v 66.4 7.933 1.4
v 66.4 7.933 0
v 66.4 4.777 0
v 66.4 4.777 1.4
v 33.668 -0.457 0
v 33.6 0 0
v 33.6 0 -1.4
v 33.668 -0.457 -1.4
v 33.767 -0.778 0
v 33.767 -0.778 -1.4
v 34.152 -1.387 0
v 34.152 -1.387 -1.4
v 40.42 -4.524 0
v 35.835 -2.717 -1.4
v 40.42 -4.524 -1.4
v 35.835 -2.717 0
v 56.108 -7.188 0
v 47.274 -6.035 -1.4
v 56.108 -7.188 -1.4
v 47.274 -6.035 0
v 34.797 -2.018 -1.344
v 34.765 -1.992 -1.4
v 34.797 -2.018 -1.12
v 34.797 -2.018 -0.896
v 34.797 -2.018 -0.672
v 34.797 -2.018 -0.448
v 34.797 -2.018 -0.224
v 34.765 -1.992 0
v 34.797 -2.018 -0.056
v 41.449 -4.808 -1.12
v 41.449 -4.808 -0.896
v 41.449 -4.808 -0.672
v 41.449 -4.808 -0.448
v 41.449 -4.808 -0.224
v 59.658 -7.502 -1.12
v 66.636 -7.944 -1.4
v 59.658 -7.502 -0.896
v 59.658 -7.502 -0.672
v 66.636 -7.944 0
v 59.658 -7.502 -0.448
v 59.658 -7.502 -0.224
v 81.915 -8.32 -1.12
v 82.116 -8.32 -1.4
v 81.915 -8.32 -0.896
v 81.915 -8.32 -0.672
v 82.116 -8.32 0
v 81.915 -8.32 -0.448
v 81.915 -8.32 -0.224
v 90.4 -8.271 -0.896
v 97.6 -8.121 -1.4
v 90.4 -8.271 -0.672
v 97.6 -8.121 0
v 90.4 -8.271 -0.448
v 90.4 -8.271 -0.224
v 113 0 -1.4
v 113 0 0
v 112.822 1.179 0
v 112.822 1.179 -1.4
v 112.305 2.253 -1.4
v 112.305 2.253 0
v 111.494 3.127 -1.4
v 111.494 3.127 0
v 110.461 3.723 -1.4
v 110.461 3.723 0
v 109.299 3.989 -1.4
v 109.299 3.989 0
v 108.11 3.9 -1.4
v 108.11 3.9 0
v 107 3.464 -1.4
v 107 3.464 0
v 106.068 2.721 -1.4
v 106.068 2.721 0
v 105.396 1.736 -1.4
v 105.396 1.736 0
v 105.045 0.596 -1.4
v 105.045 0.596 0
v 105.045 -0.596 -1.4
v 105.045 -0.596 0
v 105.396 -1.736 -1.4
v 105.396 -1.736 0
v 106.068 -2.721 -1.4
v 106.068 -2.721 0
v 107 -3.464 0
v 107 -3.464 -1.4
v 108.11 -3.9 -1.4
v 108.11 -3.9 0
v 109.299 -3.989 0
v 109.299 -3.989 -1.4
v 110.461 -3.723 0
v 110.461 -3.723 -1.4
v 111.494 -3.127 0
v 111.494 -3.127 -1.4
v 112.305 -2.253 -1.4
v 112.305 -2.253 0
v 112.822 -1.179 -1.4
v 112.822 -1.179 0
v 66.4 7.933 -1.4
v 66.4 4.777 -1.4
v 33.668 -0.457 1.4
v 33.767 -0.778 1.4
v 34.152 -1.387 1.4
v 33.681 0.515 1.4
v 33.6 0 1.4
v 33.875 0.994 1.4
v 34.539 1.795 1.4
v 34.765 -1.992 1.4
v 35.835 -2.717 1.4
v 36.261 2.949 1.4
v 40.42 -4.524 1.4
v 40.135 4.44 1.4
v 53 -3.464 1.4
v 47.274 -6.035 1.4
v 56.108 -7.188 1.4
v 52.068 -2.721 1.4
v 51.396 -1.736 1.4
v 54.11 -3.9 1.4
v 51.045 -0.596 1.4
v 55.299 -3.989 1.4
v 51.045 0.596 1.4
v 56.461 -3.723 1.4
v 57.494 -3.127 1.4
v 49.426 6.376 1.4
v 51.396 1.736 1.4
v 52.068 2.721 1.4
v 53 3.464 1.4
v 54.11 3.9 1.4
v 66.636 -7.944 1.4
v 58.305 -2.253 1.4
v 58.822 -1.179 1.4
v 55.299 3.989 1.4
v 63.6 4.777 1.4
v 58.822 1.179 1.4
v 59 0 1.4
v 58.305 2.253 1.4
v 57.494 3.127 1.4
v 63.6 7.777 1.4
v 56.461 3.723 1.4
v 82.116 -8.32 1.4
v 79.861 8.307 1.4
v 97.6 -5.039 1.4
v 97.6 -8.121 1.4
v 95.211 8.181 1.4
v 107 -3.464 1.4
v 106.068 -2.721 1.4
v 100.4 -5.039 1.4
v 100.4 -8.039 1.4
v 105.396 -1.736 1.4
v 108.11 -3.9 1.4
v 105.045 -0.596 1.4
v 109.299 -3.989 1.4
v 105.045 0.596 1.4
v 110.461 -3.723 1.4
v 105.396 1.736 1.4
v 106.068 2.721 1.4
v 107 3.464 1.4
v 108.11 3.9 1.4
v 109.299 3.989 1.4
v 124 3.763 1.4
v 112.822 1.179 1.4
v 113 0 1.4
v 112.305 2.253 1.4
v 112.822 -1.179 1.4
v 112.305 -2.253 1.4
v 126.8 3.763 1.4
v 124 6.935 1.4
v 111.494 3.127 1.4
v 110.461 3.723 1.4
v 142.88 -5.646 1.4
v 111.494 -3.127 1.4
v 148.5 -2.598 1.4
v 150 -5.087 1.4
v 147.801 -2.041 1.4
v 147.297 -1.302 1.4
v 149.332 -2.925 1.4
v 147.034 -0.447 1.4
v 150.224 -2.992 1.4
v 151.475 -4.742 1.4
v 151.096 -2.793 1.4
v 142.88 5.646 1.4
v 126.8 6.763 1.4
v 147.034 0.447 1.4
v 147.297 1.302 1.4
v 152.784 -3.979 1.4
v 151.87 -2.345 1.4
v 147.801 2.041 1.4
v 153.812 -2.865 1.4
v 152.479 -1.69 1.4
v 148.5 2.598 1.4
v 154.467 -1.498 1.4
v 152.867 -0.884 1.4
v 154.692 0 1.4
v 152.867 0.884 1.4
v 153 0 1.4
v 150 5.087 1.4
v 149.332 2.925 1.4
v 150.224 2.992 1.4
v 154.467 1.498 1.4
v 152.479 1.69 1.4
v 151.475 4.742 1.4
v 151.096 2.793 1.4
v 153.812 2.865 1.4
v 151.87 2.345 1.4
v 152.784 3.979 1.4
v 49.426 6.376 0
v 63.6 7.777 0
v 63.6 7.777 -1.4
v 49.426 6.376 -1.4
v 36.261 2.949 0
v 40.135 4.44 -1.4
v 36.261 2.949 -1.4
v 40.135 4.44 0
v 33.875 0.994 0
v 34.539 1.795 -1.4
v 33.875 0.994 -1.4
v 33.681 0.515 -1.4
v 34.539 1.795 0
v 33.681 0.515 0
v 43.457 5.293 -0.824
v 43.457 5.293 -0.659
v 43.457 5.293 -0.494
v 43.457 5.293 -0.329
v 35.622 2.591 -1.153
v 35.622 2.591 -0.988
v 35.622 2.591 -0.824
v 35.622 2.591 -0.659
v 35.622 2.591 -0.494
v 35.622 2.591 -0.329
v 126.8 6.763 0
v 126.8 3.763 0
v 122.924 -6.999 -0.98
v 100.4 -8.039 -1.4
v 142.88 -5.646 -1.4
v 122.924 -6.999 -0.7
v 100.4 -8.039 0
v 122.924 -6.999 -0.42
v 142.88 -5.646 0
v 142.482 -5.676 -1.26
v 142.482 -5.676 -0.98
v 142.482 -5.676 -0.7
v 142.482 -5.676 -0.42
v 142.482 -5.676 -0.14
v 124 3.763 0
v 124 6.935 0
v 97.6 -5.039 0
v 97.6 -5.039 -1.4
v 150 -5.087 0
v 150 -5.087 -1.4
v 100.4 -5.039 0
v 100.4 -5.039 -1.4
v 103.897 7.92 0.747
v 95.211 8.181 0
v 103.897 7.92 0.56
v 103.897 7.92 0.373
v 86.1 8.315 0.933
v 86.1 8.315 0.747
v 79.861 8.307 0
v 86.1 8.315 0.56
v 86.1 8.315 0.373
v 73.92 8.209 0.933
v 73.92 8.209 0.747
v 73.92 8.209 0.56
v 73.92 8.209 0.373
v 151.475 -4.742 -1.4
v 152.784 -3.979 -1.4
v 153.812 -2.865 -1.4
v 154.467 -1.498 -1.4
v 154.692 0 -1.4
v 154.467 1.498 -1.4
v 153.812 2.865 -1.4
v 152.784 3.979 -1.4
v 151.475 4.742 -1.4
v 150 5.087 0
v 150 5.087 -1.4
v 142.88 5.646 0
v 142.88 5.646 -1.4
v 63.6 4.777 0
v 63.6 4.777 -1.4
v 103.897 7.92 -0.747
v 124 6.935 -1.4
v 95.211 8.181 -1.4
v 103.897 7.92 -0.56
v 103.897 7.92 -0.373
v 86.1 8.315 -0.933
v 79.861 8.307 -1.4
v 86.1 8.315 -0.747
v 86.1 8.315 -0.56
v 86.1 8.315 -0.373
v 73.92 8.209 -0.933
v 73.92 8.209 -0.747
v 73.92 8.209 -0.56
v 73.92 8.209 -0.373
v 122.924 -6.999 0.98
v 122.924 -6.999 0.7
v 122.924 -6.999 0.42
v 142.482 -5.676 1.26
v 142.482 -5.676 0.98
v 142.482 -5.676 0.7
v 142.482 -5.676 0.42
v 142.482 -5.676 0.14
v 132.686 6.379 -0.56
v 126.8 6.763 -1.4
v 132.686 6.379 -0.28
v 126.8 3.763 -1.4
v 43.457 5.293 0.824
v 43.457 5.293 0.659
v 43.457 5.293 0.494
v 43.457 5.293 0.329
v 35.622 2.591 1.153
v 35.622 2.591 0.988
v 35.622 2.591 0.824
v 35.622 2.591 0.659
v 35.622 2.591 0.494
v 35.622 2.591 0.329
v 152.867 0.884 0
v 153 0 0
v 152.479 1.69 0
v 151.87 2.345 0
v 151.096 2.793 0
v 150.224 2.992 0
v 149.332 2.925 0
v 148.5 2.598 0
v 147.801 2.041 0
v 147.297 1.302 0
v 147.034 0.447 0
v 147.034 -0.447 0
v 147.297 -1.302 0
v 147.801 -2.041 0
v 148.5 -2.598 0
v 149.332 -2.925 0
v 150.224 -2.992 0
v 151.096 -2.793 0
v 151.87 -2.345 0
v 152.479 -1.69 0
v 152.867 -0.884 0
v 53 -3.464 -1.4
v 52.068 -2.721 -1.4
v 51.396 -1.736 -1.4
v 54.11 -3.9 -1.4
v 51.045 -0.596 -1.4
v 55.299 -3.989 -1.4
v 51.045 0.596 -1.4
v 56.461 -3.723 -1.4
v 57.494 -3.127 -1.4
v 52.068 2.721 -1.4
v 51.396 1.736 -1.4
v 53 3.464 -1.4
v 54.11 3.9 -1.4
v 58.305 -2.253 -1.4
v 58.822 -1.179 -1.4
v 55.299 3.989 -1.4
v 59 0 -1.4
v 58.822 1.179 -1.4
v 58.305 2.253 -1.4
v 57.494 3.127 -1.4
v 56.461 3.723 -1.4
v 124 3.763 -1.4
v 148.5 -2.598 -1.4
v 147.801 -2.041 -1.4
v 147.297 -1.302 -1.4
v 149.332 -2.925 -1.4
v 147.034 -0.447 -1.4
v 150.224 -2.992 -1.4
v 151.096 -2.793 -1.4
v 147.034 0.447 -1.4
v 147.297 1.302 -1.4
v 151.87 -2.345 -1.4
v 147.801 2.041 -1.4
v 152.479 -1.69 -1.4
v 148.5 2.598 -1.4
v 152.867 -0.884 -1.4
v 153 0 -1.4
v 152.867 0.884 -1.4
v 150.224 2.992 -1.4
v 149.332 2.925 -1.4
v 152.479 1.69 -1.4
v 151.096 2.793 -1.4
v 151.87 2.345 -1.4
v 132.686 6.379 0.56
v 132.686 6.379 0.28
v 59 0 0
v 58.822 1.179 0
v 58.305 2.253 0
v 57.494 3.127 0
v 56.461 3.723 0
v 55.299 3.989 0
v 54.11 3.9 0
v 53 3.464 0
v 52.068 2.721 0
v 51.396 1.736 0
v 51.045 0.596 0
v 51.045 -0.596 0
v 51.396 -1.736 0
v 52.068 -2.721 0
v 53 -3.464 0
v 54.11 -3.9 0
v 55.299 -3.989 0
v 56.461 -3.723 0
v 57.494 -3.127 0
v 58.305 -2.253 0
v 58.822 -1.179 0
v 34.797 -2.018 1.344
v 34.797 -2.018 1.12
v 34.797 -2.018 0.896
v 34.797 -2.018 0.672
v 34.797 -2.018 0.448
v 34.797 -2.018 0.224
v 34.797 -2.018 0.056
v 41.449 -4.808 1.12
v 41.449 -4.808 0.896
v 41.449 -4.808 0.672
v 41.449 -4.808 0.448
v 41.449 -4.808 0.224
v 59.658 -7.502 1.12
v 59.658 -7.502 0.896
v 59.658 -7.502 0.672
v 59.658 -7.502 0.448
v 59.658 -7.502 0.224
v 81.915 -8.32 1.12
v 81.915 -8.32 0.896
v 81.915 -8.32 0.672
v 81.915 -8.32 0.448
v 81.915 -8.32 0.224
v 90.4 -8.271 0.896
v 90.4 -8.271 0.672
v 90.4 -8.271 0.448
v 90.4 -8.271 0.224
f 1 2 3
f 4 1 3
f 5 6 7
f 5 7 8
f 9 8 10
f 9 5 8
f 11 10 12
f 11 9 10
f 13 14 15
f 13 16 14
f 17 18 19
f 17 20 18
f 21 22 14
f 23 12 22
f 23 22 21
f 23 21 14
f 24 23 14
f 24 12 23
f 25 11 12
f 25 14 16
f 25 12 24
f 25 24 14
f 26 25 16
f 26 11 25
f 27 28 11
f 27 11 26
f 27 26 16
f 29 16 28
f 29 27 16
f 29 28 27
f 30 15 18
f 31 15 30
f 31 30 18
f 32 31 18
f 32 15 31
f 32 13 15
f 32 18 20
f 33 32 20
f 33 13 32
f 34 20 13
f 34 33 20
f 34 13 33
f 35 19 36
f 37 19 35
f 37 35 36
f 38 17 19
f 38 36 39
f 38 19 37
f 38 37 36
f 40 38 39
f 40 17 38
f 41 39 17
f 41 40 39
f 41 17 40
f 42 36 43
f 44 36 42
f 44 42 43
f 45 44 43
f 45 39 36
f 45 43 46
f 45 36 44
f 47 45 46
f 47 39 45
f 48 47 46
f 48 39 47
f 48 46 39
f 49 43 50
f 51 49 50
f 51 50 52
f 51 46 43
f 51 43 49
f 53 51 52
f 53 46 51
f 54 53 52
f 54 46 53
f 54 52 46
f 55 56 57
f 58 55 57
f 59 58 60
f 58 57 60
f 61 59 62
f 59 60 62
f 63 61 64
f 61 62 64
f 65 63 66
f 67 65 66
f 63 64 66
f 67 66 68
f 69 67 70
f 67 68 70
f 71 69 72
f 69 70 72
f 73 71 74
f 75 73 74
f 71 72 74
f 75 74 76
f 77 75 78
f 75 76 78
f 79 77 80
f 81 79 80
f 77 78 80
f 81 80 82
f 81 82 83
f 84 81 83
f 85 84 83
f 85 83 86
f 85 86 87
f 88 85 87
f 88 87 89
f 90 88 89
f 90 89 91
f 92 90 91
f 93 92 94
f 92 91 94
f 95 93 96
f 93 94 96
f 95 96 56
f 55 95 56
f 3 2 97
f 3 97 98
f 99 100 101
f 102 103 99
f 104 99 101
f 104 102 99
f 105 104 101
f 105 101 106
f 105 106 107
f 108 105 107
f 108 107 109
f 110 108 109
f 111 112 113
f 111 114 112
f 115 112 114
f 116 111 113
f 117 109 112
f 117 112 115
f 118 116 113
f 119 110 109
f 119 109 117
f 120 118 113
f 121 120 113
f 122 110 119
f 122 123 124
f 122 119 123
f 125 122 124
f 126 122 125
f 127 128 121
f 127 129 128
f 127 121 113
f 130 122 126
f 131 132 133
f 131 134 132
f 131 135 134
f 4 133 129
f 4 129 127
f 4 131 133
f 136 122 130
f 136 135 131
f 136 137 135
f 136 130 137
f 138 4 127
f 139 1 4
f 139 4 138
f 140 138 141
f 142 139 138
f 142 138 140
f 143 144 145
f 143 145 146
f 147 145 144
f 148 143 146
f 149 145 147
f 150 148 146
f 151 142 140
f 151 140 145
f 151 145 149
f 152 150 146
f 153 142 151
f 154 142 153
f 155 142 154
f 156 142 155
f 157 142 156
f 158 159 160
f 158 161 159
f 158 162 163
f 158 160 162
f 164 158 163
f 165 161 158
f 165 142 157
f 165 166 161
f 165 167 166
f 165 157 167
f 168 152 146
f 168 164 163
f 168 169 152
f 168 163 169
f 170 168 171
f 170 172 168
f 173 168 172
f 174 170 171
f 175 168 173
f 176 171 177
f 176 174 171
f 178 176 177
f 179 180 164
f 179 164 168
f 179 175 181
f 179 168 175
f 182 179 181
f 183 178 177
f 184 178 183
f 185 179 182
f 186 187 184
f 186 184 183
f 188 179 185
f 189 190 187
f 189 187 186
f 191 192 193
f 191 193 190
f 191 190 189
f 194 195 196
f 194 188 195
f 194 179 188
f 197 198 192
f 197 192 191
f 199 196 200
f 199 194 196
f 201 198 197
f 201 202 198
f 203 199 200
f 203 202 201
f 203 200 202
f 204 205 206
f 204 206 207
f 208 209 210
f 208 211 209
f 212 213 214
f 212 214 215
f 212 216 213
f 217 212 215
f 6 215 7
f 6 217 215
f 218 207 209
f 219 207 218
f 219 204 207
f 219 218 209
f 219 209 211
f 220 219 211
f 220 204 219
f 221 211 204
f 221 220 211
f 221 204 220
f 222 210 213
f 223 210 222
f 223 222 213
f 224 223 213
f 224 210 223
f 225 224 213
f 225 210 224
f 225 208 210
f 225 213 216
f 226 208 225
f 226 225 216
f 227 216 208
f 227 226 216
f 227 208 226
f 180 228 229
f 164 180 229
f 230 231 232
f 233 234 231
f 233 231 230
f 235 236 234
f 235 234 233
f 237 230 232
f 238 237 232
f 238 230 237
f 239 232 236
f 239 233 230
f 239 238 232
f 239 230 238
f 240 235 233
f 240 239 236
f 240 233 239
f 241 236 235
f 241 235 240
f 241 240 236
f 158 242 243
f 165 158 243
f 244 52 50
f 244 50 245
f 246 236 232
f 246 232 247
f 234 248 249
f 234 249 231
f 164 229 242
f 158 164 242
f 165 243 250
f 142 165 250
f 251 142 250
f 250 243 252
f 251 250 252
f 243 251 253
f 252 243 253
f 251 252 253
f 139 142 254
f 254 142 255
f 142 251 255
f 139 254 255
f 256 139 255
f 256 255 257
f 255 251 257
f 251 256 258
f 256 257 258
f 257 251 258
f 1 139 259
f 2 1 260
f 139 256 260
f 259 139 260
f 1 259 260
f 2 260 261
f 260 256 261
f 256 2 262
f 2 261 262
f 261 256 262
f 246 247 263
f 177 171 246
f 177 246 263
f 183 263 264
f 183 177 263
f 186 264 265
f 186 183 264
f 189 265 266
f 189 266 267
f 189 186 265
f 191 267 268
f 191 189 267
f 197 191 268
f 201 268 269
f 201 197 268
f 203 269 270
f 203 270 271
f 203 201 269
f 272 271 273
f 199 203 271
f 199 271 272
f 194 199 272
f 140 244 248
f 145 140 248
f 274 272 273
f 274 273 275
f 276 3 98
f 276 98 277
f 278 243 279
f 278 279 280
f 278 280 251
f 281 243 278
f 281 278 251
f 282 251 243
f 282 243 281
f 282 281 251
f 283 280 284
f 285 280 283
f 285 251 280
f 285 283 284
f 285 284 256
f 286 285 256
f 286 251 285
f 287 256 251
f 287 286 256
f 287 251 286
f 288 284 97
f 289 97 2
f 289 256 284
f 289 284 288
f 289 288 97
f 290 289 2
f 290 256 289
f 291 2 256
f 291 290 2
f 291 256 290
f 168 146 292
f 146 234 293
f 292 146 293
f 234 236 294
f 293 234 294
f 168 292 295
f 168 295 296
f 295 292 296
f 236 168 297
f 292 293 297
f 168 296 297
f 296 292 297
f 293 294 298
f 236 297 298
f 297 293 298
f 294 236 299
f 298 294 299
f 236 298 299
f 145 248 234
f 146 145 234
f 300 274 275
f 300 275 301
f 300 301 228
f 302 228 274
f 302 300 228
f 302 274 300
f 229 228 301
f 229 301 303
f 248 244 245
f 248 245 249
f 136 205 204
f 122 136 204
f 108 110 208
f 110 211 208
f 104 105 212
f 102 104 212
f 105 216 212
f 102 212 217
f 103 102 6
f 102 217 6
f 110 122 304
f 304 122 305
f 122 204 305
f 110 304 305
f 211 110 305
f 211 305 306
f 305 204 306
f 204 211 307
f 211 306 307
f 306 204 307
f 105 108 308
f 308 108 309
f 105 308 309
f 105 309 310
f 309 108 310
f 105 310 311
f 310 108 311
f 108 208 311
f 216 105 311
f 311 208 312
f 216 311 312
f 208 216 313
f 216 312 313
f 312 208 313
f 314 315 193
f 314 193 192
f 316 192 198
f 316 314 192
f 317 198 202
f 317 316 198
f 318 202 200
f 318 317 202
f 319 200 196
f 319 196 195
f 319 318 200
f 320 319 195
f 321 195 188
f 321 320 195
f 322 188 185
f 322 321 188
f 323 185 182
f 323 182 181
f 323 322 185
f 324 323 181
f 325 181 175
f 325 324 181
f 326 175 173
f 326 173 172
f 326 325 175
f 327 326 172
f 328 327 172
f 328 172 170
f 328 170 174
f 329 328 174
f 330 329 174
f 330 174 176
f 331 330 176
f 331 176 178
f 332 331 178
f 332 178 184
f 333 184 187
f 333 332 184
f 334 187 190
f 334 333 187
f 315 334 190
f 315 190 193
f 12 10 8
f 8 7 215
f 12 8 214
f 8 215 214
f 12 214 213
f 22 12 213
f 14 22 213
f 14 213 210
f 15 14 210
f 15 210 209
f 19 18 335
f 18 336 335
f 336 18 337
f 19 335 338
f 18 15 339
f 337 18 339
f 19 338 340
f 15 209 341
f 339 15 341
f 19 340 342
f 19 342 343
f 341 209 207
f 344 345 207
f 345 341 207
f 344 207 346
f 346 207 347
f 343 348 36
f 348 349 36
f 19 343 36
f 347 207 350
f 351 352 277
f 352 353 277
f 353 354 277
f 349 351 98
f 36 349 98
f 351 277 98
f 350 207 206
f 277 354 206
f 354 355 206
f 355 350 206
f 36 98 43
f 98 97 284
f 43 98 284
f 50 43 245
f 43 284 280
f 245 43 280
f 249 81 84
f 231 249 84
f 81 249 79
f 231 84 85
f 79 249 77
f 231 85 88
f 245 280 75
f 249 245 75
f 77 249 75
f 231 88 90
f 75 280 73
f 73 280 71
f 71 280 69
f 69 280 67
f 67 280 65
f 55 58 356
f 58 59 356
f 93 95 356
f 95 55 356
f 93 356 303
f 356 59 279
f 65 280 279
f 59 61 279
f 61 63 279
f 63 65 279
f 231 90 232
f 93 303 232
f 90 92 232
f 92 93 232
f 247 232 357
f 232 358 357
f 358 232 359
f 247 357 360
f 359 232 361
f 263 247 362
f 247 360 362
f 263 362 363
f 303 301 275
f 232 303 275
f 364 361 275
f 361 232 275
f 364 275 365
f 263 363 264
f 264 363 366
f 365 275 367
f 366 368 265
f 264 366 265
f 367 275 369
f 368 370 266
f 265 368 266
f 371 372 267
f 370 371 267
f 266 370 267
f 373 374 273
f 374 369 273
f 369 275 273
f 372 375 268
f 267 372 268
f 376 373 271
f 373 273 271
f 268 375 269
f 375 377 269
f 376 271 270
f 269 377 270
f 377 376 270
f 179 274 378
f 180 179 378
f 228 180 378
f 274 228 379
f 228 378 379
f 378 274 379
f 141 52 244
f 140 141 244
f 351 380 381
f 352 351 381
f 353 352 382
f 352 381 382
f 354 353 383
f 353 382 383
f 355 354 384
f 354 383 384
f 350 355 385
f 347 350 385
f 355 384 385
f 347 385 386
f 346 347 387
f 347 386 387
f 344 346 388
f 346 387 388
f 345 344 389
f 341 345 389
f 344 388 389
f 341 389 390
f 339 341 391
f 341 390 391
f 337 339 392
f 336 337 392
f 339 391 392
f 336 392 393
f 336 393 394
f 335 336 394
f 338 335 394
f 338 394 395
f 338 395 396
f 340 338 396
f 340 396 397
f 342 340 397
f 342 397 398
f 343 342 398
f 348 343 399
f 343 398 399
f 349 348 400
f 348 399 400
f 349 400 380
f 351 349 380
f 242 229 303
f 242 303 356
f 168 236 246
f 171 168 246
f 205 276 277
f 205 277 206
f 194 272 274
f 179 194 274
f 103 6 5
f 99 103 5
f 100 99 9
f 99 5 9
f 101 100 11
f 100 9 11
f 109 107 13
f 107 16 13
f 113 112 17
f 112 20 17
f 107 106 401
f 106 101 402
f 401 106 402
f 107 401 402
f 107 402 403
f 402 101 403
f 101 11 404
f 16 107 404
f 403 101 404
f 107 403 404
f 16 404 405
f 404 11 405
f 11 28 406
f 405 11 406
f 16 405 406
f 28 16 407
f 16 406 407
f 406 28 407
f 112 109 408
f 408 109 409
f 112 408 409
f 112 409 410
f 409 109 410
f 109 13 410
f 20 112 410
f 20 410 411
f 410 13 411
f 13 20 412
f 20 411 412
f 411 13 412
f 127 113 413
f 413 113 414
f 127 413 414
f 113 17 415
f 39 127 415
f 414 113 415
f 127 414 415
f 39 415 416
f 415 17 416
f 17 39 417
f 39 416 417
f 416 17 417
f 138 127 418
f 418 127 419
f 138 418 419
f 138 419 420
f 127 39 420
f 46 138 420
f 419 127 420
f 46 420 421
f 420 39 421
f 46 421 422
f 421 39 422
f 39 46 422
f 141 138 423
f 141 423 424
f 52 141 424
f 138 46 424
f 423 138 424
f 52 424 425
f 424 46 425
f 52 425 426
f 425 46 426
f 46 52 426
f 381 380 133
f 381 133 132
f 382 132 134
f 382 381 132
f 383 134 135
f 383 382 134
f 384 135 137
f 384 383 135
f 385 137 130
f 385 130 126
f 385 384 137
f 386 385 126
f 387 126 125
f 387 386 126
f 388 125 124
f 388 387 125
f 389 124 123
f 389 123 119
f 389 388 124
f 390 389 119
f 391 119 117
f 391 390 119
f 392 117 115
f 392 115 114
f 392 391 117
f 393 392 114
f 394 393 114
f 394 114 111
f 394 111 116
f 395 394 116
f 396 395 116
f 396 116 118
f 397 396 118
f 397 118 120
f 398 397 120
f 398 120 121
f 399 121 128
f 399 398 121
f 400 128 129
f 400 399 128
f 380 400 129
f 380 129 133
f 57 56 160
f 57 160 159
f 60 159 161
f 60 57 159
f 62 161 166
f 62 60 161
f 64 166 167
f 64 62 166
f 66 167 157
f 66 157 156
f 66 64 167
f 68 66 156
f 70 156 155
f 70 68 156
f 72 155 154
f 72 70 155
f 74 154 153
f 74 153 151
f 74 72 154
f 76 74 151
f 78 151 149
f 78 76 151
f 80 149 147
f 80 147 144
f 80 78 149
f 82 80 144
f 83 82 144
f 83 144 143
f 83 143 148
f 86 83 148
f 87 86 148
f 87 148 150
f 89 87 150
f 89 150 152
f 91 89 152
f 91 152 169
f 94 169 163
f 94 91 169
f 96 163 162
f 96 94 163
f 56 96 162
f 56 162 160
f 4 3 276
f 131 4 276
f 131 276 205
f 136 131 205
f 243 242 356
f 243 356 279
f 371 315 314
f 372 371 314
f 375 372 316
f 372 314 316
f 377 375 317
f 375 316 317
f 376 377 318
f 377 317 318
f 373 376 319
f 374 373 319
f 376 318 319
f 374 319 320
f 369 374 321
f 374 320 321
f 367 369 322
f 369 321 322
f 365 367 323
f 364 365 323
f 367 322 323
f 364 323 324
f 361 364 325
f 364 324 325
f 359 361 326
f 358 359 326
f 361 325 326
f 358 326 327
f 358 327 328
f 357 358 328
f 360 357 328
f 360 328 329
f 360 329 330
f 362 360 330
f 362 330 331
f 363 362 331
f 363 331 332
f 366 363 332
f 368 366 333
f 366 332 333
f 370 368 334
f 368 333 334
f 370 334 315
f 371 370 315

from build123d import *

# Parameters (mm, degrees)
SKETCH_1_R      = 4
SKETCH_1_R_2    = 3
EXTRUDE_1_DEPTH = 1.4


with BuildPart() as part:
    # Эскиз1 → Бобышка-Вытянуть1 (new, symmetric)
    # profile 1 of 3: a face of its own
    with BuildSketch(Plane.XY):
        with BuildLine():
            ThreePointArc((142.879654521, -5.645889143), (140.91290042, 0), (142.879654521, 5.645889143))
            add(Edge.make_bspline(
                [(142.879654521, 5.645889143), (142.747268556, 5.655935735), (140.983089587, 5.789556497), (137.585492165, 6.040187447), (132.68922042, 6.382393711), (129.093359344, 6.61888416), (127.131231234, 6.742693318), (126.8, 6.763442063)],
                knots=[0.339950039, 0.339950039, 0.339950039, 0.339950039, 0.342309554, 0.371392651, 0.400495753, 0.429537687, 0.435435831, 0.435435831, 0.435435831, 0.435435831], degree=3))
            Line((126.8, 6.763442063), (126.8, 3.763442063))
            Line((126.8, 3.763442063), (124, 3.763442063))
            Line((124, 3.763442063), (124, 6.935165252))
            add(Edge.make_bspline(
                [(124, 6.935165252), (123.641212233, 6.956691636), (121.670677761, 7.073894152), (118.103435227, 7.275698401), (113.316671904, 7.521871639), (108.586398202, 7.738792494), (103.923211277, 7.924514665), (99.337253306, 8.077210344), (94.83828356, 8.195186848), (90.435677893, 8.276886408), (86.138497273, 8.320981466), (81.955490955, 8.326384834), (77.89513162, 8.292131727), (73.965623193, 8.217718888), (70.174939177, 8.10268745), (67.668791632, 7.99564794), (66.426868705, 7.933879191), (66.4, 7.93253874)],
                knots=[0.452054102, 0.452054102, 0.452054102, 0.452054102, 0.458441906, 0.487136114, 0.515551917, 0.543623847, 0.571289985, 0.59849081, 0.625169613, 0.651272029, 0.676746158, 0.701541791, 0.725611017, 0.748907835, 0.771387785, 0.793008139, 0.793486237, 0.793486237, 0.793486237, 0.793486237], degree=3))
            Line((66.4, 7.93253874), (66.4, 4.777447755))
            Line((66.4, 4.777447755), (63.6, 4.777447755))
            Line((63.6, 4.777447755), (63.6, 7.777447755))
            add(Edge.make_bspline(
                [(63.6, 7.777447755), (63.396162512, 7.764994786), (62.081509824, 7.682983398), (59.712211754, 7.515019975), (56.552200858, 7.239849215), (53.56772758, 6.926570619), (50.765590148, 6.57637304), (48.152410031, 6.190731972), (45.734630901, 5.771261543), (43.518525859, 5.319707647), (41.510178464, 4.837901503), (39.715362287, 4.3277629), (38.139724526, 3.791042715), (36.787821083, 3.229441513), (35.665157045, 2.644102252), (34.771002159, 2.034538769), (34.118995376, 1.396849457), (33.68372682, 0.718681816), (33.626994167, 0.231708516), (33.6, 0)],
                knots=[0.810098727, 0.810098727, 0.810098727, 0.810098727, 0.813728033, 0.833507815, 0.852309696, 0.87009731, 0.886835918, 0.902492782, 0.917037139, 0.930441054, 0.942679762, 0.953733567, 0.963589785, 0.972247019, 0.979722225, 0.986065145, 0.991385258, 0.995900989, 1, 1, 1, 1], degree=3))
            add(Edge.make_bspline(
                [(33.6, 0), (33.626994167, -0.231708516), (33.68372682, -0.718681816), (34.118995376, -1.396849457), (34.771002159, -2.034538769), (35.665157045, -2.644102252), (36.787821083, -3.229441513), (38.139724526, -3.791042715), (39.715362287, -4.3277629), (41.510178464, -4.837901503), (43.518525859, -5.319707647), (45.734630901, -5.771261543), (48.152410031, -6.190731972), (50.765590148, -6.57637304), (53.56772758, -6.926570619), (56.552200858, -7.239849215), (59.712211754, -7.515019975), (63.040803104, -7.750989271), (66.530820659, -7.947044314), (70.174939177, -8.10268745), (73.965623193, -8.217718888), (77.89513162, -8.292131727), (81.955490955, -8.326384834), (86.138497273, -8.320981466), (90.435677893, -8.276886408), (94.268903337, -8.20575289), (96.668631576, -8.146352686), (97.6, -8.121192528)],
                knots=[0, 0, 0, 0, 0.004099011, 0.008614742, 0.013934855, 0.020277775, 0.027752981, 0.036410215, 0.046266433, 0.057320238, 0.069558946, 0.082962861, 0.097507218, 0.113164082, 0.12990269, 0.147690304, 0.166492185, 0.186271967, 0.206991861, 0.228612215, 0.251092165, 0.274388983, 0.298458209, 0.323253842, 0.348727971, 0.374830387, 0.391388582, 0.391388582, 0.391388582, 0.391388582], degree=3))
            Line((97.6, -8.121192528), (97.6, -5.039340517))
            Line((97.6, -5.039340517), (100.4, -5.039340517))
            Line((100.4, -5.039340517), (100.4, -8.039340517))
            add(Edge.make_bspline(
                [(100.400000001, -8.039340517), (101.56572059, -8.002730044), (104.287183669, -7.910018625), (108.586398202, -7.738792494), (113.316671904, -7.521871639), (118.103435227, -7.275698401), (122.935626987, -7.002334081), (127.801626972, -6.703838046), (132.68922042, -6.382393711), (137.585492165, -6.040187447), (140.983089587, -5.789556497), (142.747268556, -5.655935735), (142.879654521, -5.645889143)],
                knots=[0.40798276, 0.40798276, 0.40798276, 0.40798276, 0.428710015, 0.456376153, 0.484448083, 0.512863886, 0.541558094, 0.570462313, 0.599504247, 0.628607349, 0.657690446, 0.660049961, 0.660049961, 0.660049961, 0.660049961], degree=3))
        make_face()
        with Locations((55, 0)):
            Circle(SKETCH_1_R, mode=Mode.SUBTRACT)
        with Locations((109, 0)):
            Circle(SKETCH_1_R, mode=Mode.SUBTRACT)
    # profile 2 of 3: a face of its own
    with BuildSketch(Plane.XY):
        with BuildLine():
            ThreePointArc((150, -5.087100899), (144.91290042, 0), (150, 5.087100899))
            add(Edge.make_bspline(
                [(150, 5.087100899), (149.119852039, 5.158405472), (146.746701571, 5.348471448), (144.373077342, 5.532555307), (142.879654521, 5.645889143)],
                knots=[0.297639613, 0.297639613, 0.297639613, 0.297639613, 0.313332763, 0.339950039, 0.339950039, 0.339950039, 0.339950039], degree=3))
            ThreePointArc((142.879654521, 5.645889143), (140.91290042, 0), (142.879654521, -5.645889143))
            add(Edge.make_bspline(
                [(142.879654521, -5.645889143), (144.373077342, -5.532555307), (146.746701571, -5.348471448), (149.119852039, -5.158405472), (150, -5.087100899)],
                knots=[0.660049961, 0.660049961, 0.660049961, 0.660049961, 0.686667237, 0.702360387, 0.702360387, 0.702360387, 0.702360387], degree=3))
        make_face()
    # profile 3 of 3: a face of its own
    with BuildSketch(Plane.XY):
        with BuildLine():
            ThreePointArc((150, 5.087100899), (144.91290042, 0), (150, -5.087100899))
            ThreePointArc((150, -5.087100899), (154.691639791, 0), (150, 5.087100899))
        make_face()
        with Locations((150.000001319, 0)):
            Circle(SKETCH_1_R_2, mode=Mode.SUBTRACT)
    extrude(amount=EXTRUDE_1_DEPTH, both=True)


solid = part.part
